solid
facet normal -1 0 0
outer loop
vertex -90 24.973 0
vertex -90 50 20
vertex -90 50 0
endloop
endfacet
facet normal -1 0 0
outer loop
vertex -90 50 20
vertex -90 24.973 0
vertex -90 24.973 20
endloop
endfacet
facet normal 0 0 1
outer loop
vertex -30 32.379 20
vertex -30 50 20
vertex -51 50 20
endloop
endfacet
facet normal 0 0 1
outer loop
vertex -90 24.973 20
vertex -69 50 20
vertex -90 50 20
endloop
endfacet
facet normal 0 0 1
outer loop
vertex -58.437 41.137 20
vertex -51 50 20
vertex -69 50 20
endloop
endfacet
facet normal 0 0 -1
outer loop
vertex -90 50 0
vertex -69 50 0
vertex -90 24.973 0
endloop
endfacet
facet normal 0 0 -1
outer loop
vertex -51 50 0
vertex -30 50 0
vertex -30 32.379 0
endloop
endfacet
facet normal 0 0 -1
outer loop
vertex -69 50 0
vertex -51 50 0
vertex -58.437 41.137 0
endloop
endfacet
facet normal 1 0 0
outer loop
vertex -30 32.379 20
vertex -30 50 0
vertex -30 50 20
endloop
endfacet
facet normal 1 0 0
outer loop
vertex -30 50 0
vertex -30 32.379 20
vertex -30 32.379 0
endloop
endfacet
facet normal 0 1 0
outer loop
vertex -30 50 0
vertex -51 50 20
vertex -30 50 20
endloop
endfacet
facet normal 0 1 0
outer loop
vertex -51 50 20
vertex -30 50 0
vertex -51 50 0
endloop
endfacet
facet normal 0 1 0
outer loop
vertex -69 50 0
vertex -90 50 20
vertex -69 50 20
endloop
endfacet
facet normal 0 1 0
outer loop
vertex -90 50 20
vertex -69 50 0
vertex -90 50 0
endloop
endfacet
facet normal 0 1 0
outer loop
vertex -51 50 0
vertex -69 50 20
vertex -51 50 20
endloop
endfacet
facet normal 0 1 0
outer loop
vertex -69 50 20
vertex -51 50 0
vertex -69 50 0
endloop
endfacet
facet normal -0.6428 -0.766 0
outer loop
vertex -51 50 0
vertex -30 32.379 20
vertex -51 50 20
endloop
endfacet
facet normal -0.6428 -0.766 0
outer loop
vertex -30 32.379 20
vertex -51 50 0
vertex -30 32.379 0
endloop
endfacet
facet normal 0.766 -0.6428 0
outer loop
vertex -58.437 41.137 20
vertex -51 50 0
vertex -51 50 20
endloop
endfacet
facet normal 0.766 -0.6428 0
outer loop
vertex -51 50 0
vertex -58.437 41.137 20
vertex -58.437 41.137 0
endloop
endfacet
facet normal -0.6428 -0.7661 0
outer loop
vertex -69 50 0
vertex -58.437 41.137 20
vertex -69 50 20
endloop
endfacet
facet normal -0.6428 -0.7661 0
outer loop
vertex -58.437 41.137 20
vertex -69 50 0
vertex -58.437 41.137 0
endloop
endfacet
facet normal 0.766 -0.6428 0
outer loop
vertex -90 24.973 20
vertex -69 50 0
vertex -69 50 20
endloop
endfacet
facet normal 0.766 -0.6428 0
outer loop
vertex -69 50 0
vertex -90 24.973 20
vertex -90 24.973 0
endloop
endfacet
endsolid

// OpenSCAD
translate([-30,50,0])
scale([3,3,1])
rotate([0,0,+180]) {
    difference() {
        cube([20, 20, 20]);
        translate([7, 0, -1]) {
            rotate([0,0,50]) {
                cube([30, 30, 30]);
            }
        }
        translate([13, 0, -1]) {
            rotate([0,0,50]) {
                cube([30, 30, 30]);
            }
        }
    }
}
